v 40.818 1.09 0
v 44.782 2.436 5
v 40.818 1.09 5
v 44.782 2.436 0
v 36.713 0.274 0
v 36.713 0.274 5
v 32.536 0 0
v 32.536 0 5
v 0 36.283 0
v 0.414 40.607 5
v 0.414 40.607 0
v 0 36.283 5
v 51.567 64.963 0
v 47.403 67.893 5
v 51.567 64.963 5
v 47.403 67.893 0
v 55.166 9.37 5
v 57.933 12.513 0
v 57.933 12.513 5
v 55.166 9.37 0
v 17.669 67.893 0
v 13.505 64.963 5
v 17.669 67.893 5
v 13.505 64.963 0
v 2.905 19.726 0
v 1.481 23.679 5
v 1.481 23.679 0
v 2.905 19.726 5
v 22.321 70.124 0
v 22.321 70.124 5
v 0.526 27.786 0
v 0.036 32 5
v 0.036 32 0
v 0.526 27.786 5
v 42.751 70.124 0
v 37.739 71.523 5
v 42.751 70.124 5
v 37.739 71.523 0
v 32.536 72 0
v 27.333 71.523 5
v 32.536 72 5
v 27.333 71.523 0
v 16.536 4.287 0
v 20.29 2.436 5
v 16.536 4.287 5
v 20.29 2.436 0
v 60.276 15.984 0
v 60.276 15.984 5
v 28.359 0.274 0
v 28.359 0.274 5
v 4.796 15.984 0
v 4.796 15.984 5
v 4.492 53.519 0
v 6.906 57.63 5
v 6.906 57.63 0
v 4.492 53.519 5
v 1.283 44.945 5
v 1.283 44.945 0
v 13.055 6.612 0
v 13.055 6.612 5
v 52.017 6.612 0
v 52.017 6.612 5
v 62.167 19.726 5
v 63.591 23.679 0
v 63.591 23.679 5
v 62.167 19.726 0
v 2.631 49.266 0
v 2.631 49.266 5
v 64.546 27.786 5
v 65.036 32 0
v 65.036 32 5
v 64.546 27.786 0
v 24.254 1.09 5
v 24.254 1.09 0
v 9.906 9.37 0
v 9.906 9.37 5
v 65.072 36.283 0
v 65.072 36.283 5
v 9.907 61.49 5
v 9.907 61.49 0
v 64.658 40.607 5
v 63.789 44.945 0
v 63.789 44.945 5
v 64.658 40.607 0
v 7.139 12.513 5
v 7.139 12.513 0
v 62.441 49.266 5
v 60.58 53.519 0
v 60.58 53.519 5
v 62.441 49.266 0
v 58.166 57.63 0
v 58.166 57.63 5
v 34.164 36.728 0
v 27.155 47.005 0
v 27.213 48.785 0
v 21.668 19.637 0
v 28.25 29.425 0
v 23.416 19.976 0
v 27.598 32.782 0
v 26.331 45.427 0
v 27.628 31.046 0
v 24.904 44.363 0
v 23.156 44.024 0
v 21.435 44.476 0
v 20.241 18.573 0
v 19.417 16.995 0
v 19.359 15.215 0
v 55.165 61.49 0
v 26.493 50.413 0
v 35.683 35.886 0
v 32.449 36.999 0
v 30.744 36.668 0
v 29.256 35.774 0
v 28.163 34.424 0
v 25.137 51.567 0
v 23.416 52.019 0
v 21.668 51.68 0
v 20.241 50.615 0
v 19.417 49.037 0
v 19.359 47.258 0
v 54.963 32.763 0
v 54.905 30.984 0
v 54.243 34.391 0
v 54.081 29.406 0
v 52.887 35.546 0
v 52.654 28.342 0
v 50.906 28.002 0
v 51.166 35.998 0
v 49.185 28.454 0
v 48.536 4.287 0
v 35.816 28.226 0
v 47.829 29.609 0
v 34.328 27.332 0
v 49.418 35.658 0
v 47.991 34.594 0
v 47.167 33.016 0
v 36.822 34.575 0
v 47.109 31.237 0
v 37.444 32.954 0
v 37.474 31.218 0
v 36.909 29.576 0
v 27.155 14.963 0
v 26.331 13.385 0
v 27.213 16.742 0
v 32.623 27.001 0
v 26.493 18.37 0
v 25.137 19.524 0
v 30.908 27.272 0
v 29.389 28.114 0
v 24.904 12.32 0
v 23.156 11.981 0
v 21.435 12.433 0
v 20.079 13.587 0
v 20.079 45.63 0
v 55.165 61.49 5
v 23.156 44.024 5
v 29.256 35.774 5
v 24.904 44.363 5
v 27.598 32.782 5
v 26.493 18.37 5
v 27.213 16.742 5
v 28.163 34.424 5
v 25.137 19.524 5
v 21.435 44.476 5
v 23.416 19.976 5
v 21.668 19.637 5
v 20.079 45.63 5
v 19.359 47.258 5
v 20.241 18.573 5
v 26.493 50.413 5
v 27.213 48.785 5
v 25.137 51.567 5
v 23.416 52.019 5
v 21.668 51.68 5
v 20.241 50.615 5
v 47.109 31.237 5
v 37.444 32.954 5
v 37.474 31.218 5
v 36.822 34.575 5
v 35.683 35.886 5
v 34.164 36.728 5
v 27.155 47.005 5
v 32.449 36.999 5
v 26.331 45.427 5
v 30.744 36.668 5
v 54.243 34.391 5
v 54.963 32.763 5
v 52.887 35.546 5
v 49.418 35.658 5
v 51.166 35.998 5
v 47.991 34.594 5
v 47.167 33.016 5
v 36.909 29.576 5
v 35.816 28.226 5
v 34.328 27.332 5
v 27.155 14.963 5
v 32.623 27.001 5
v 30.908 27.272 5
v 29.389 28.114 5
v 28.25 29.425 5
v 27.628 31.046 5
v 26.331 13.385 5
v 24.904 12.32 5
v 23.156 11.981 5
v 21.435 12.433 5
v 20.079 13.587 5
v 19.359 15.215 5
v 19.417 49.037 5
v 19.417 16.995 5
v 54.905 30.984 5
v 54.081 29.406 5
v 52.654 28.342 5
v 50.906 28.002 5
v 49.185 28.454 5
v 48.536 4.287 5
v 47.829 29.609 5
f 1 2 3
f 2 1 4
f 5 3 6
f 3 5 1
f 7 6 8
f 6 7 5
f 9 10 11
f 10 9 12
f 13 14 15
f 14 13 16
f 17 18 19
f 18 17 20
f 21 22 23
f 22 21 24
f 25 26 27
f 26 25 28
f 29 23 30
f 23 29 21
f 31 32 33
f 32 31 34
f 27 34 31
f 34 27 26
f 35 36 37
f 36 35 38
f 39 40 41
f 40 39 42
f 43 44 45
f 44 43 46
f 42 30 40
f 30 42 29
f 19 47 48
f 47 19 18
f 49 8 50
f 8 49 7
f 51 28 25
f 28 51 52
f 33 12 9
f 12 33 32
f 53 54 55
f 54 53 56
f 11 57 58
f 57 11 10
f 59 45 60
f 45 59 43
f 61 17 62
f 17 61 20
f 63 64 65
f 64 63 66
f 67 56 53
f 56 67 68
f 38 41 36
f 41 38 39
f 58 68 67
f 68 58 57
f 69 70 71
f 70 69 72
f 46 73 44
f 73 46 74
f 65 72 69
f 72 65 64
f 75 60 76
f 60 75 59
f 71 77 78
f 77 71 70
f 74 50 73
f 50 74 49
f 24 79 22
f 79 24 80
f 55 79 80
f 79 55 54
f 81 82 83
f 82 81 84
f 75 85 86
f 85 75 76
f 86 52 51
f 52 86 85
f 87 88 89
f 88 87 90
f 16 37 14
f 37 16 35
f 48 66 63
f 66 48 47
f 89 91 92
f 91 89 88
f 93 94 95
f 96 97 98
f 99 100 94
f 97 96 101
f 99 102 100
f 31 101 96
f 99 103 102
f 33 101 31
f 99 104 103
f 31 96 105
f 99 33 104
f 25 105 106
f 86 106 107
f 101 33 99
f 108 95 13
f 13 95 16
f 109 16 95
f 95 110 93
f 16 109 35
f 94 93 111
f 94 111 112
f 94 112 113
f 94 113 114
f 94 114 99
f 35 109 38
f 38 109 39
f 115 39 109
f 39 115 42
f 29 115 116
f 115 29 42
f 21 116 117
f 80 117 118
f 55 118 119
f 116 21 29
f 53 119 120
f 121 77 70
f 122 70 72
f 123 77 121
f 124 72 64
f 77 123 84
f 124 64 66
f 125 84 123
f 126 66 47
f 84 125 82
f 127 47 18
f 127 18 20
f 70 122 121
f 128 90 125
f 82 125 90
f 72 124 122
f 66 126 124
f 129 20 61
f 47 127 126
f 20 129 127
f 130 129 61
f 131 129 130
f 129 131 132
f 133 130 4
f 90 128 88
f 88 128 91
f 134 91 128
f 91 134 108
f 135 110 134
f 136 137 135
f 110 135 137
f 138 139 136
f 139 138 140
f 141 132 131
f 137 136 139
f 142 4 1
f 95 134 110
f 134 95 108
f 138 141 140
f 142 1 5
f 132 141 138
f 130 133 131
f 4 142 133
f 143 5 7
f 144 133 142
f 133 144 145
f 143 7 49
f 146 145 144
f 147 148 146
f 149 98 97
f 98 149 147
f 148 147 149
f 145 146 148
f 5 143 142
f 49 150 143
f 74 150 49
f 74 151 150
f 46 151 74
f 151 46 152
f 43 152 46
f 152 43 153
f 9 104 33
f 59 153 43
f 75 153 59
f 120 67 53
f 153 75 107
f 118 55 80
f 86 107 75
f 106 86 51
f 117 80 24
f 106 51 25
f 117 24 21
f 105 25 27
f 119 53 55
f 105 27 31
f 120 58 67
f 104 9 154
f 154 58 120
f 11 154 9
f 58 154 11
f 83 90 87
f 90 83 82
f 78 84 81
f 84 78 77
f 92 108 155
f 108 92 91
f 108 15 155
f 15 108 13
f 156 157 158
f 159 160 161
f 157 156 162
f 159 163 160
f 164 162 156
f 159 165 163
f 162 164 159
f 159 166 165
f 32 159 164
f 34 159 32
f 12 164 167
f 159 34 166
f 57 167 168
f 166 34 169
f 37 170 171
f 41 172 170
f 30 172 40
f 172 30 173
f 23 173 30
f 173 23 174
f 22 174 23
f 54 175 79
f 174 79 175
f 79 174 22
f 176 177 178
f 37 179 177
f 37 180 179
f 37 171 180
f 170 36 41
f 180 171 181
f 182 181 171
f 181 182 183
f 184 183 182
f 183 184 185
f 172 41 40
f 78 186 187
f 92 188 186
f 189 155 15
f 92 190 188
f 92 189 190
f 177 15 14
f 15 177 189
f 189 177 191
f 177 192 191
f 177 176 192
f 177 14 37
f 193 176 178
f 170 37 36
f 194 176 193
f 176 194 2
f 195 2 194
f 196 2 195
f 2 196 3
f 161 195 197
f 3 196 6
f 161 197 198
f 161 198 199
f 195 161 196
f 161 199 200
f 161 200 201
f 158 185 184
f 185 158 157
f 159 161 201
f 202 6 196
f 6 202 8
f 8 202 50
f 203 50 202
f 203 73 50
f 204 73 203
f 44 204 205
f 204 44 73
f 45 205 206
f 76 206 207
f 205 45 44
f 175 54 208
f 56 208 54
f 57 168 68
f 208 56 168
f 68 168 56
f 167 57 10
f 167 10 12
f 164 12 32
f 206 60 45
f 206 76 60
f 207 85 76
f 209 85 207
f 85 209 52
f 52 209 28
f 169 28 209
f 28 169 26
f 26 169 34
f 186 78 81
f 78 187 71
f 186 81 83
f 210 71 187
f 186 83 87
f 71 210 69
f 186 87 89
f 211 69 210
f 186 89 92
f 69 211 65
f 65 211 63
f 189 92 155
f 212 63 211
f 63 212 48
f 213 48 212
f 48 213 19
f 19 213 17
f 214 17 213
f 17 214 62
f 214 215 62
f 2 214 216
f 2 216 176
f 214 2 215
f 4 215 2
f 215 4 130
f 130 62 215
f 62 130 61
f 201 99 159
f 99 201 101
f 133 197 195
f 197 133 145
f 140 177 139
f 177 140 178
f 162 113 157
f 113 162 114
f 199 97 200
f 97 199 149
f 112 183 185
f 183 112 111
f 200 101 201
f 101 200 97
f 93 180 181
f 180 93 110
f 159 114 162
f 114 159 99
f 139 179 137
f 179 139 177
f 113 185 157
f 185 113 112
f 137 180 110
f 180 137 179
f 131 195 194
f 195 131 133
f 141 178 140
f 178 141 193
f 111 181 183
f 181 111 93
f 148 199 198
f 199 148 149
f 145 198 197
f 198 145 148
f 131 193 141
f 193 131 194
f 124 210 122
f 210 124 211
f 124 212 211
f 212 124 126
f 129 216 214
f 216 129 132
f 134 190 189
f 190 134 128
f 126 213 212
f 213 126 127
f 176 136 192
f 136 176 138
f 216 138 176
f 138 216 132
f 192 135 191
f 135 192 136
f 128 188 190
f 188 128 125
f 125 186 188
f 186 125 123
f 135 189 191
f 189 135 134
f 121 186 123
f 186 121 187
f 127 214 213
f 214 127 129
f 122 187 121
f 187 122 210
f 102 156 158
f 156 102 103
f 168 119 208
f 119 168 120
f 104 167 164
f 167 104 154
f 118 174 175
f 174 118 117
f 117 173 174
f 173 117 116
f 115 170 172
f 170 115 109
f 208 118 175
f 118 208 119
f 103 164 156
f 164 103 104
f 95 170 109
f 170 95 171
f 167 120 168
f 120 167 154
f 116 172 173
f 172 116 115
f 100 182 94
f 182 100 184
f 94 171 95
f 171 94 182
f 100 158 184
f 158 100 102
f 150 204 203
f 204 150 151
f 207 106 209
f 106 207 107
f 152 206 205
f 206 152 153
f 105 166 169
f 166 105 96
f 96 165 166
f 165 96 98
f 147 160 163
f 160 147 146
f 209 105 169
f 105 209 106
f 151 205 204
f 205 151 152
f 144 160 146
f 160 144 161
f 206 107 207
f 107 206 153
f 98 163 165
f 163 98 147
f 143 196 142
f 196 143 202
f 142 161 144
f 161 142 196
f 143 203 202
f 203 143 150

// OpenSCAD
$fn = 32;

// ----------------------------------------------------------------------
// Cam plate: single_lobe cam, base R32
// ----------------------------------------------------------------------

// --- parameters (mm) ---
base_r = 32;              // base circle radius
lobe_h = 8;               // cam lobe rise
bore_r = 5;               // shaft bore radius
plate_t = 5;              // plate thickness, Z (extrusion height)
ring_r = 18.5;            // lightening ring radius
bolt_r = 4;               // lightening hole radius

profile = [[65.036, 32], [65.072, 36.283], [64.658, 40.607], [63.789, 44.945], [62.441, 49.266], [60.58, 53.519], [58.166, 57.63], [55.165, 61.49], [51.567, 64.963], [47.403, 67.893], [42.751, 70.124], [37.739, 71.523], [32.536, 72], [27.333, 71.523], [22.321, 70.124], [17.669, 67.893], [13.505, 64.963], [9.907, 61.49], [6.906, 57.63], [4.492, 53.519], [2.631, 49.266], [1.283, 44.945], [0.414, 40.607], [0, 36.283], [0.036, 32], [0.526, 27.786], [1.481, 23.679], [2.905, 19.726], [4.796, 15.984], [7.139, 12.513], [9.906, 9.37], [13.055, 6.612], [16.536, 4.287], [20.29, 2.436], [24.254, 1.09], [28.359, 0.274], [32.536, 0], [36.713, 0.274], [40.818, 1.09], [44.782, 2.436], [48.536, 4.287], [52.017, 6.612], [55.166, 9.37], [57.933, 12.513], [60.276, 15.984], [62.167, 19.726], [63.591, 23.679], [64.546, 27.786]];  // primary outline, 48 points, counter clockwise
void_1 = [[37.444, 32.954], [36.822, 34.575], [35.683, 35.886], [34.164, 36.728], [32.449, 36.999], [30.744, 36.668], [29.256, 35.774], [28.163, 34.424], [27.598, 32.782], [27.628, 31.046], [28.25, 29.425], [29.389, 28.114], [30.908, 27.272], [32.623, 27.001], [34.328, 27.332], [35.816, 28.226], [36.909, 29.576], [37.474, 31.218]];  // shaft bore, 18 points
void_2 = [[54.963, 32.763], [54.243, 34.391], [52.887, 35.546], [51.166, 35.998], [49.418, 35.658], [47.991, 34.594], [47.167, 33.016], [47.109, 31.237], [47.829, 29.609], [49.185, 28.454], [50.906, 28.002], [52.654, 28.342], [54.081, 29.406], [54.905, 30.984]];  // lightening hole 1, 14 points
void_3 = [[27.213, 48.785], [26.493, 50.413], [25.137, 51.567], [23.416, 52.019], [21.668, 51.68], [20.241, 50.615], [19.417, 49.037], [19.359, 47.258], [20.079, 45.63], [21.435, 44.476], [23.156, 44.024], [24.904, 44.363], [26.331, 45.427], [27.155, 47.005]];  // lightening hole 2, 14 points
void_4 = [[27.213, 16.742], [26.493, 18.37], [25.137, 19.524], [23.416, 19.976], [21.668, 19.637], [20.241, 18.573], [19.417, 16.995], [19.359, 15.215], [20.079, 13.587], [21.435, 12.433], [23.156, 11.981], [24.904, 12.32], [26.331, 13.385], [27.155, 14.963]];  // lightening hole 3, 14 points

// --- the one profile operation ---
difference() {
  linear_extrude(height = plate_t) polygon(points = profile);
  translate([0, 0, -1])
    linear_extrude(height = plate_t + 2) polygon(points = void_1);
  translate([0, 0, -1])
    linear_extrude(height = plate_t + 2) polygon(points = void_2);
  translate([0, 0, -1])
    linear_extrude(height = plate_t + 2) polygon(points = void_3);
  translate([0, 0, -1])
    linear_extrude(height = plate_t + 2) polygon(points = void_4);
}
